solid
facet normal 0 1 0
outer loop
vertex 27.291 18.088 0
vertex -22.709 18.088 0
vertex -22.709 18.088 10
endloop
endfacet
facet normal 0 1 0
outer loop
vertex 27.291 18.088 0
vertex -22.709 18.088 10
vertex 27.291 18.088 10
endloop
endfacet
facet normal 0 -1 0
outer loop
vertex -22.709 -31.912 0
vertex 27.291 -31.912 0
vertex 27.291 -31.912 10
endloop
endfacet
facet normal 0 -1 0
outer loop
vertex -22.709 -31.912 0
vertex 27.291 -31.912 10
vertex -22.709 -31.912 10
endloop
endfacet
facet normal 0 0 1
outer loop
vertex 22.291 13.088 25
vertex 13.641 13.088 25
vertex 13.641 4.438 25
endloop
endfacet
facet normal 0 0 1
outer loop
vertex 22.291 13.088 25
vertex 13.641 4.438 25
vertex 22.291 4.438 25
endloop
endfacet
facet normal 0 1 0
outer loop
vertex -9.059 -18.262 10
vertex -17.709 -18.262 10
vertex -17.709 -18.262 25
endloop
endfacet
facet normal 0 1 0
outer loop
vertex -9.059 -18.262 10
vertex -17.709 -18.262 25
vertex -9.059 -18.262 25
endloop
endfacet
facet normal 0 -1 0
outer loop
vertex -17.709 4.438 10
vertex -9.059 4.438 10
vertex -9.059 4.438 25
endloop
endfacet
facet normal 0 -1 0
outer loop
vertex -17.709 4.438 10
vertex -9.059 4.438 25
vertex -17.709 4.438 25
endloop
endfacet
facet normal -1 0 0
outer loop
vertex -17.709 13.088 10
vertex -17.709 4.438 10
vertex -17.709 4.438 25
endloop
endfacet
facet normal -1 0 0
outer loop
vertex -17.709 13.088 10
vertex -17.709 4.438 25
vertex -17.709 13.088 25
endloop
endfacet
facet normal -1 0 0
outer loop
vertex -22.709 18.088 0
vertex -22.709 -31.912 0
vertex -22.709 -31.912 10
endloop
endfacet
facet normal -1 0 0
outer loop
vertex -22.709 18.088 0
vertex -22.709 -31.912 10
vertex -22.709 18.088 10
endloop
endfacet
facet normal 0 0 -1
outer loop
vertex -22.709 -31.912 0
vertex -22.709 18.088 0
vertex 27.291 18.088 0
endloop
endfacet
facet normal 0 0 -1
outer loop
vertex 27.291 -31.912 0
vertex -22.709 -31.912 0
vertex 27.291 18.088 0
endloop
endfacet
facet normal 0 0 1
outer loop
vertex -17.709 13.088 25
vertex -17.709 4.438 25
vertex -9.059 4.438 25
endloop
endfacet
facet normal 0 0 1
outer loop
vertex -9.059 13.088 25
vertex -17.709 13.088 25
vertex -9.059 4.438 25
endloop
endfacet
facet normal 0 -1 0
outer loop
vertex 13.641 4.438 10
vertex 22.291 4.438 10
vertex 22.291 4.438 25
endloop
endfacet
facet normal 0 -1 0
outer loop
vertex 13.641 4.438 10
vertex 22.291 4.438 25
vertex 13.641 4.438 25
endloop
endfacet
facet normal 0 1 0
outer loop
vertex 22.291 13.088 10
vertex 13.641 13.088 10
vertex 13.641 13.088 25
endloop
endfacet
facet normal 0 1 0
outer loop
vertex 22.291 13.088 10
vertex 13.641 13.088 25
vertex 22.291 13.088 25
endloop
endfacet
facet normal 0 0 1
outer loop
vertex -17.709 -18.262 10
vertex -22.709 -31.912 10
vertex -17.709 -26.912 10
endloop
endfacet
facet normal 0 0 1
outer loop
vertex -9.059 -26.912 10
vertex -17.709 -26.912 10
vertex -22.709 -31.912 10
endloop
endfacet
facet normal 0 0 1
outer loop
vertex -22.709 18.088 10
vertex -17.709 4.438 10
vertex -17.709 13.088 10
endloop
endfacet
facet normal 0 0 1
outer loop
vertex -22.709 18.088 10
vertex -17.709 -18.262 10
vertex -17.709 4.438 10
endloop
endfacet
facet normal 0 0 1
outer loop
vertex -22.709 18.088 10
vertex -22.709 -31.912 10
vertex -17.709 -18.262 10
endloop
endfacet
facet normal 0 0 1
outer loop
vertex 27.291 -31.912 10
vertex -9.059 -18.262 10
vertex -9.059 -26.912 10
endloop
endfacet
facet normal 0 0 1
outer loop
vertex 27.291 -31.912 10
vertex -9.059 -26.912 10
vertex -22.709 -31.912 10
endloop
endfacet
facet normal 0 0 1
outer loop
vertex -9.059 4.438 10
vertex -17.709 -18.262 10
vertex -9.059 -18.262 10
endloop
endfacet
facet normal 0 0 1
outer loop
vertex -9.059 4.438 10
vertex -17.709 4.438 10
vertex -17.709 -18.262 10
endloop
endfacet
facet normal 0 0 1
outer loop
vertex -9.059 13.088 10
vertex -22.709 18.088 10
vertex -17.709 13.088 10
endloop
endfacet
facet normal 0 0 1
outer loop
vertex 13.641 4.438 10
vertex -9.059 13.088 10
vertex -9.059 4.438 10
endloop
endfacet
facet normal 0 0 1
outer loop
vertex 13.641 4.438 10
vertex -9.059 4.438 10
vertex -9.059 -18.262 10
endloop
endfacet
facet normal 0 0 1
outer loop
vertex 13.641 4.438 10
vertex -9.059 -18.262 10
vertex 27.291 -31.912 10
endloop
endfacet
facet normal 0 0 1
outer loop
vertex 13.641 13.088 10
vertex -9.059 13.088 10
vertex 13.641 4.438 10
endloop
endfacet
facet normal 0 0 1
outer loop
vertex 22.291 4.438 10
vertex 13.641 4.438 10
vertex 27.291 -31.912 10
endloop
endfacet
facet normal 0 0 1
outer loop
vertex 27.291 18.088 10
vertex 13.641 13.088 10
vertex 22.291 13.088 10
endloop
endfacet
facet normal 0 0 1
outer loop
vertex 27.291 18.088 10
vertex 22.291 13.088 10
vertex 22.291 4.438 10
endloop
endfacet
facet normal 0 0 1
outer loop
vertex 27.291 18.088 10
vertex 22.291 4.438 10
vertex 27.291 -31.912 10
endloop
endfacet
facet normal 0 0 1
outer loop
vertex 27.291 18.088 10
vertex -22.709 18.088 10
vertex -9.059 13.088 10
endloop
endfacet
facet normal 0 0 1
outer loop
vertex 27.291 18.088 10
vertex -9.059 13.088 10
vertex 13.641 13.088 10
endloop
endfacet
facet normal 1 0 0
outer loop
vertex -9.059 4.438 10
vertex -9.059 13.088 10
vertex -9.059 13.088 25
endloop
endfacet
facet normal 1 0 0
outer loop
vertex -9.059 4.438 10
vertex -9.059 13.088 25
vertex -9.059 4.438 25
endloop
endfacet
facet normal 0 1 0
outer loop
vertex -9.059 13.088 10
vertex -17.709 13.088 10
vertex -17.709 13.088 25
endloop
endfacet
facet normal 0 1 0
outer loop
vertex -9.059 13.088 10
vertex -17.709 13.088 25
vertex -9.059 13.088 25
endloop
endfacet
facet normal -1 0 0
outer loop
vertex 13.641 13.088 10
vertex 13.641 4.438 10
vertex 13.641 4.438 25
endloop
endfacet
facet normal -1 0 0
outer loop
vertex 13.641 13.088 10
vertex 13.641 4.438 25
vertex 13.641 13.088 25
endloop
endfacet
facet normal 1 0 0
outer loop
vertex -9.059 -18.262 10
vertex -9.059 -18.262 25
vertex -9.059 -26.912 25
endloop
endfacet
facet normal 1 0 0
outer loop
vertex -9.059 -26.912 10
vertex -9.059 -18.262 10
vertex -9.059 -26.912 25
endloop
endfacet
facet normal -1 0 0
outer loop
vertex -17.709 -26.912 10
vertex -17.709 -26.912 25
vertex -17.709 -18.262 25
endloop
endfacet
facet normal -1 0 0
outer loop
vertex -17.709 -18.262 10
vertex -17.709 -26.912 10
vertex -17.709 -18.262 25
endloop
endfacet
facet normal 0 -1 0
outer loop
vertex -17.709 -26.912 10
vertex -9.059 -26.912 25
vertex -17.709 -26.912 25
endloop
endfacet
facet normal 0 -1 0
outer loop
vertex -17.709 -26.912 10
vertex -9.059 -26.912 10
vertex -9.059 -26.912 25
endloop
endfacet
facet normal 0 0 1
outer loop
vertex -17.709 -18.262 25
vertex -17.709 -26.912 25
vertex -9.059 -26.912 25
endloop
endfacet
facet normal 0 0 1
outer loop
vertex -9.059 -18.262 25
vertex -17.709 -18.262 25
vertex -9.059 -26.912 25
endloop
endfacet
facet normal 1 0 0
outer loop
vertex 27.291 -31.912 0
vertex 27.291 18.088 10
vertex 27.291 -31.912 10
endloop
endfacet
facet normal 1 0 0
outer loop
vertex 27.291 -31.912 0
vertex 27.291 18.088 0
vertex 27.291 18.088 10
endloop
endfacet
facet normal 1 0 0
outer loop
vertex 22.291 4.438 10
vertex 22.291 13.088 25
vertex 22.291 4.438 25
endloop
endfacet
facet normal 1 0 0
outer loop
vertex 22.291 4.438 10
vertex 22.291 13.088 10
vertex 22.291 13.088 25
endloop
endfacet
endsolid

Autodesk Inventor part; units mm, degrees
ref_plane "YZ Plane" through (0, 0, 0) normal (1, 0, 0) x (0, 1, 0)
ref_plane "XZ Plane" through (0, 0, 0) normal (0, 1, 0) x (-1, 0, 0)
ref_plane "XY Plane" through (0, 0, 0) normal (0, 0, 1) x (1, 0, 0)
sketch "Sketch1" plane through (0, 0, 0) normal (0, 0, 1) x (1, 0, 0)
  line L0 (-22.7093, 18.0885) -> (27.2907, 18.0885)
  line L1 (27.2907, 18.0885) -> (27.2907, -31.9115)
  line L2 (27.2907, -31.9115) -> (-22.7093, -31.9115)
  line L3 (-22.7093, -31.9115) -> (-22.7093, 18.0885)
  point P0 (0, 0)
  dimension "d0" = 50
  dimension "d1" = 50
extrude "Extrusion1" add sketch "Sketch1" along normal blind 10
sketch "Sketch3" plane through (0, 0, 10) normal (0, 0, 1) x (1, 0, 0)
  line L0 (-17.7093, 13.0885) -> (-9.0593, 13.0885)
  line L1 (-9.0593, 13.0885) -> (-9.0593, 4.4385)
  line L2 (-9.0593, 4.4385) -> (-17.7093, 4.4385)
  line L3 (-17.7093, 4.4385) -> (-17.7093, 13.0885)
  line L4 (-22.7093, 18.0885) -> (-22.7093, -31.9115) projected
  line L5 (27.2907, 18.0885) -> (-22.7093, 18.0885) projected
  line L6 (13.6407, 13.0885) -> (22.2907, 13.0885)
  line L7 (22.2907, 13.0885) -> (22.2907, 4.4385)
  line L8 (22.2907, 4.4385) -> (13.6407, 4.4385)
  line L9 (13.6407, 4.4385) -> (13.6407, 13.0885)
  line L10 (-17.7093, -18.2615) -> (-9.0593, -18.2615)
  line L11 (-9.0593, -18.2615) -> (-9.0593, -26.9115)
  line L12 (-9.0593, -26.9115) -> (-17.7093, -26.9115)
  line L13 (-17.7093, -26.9115) -> (-17.7093, -18.2615)
  line L14 (27.2907, -31.9115) -> (27.2907, 18.0885) projected
  line L15 (-22.7093, -31.9115) -> (27.2907, -31.9115) projected
  point P0 (0, 0)
  dimension "d8" = 5
  dimension "d9" = 5
  dimension "d10" = 8.65
  dimension "d11" = 8.65
  dimension "d12" = 5
  dimension "d13" = 8.65
  dimension "d14" = 8.65
  dimension "d15" = 5
  dimension "d16" = 5
  dimension "d17" = 5
  dimension "d18" = 8.65
  dimension "d19" = 8.65
extrude "Extrusion2" add sketch "Sketch3" along normal blind 15 contours L0 L1 L2 L3 | L6 L7 L8 L9 | L10 L11 L12 L13
equation "\"d13\" = d10"
equation "\"d15\" = d12"
equation "\"d16\" = d8"
equation "\"d19\" = d18"
properties part number "final_beam_cube_top"
